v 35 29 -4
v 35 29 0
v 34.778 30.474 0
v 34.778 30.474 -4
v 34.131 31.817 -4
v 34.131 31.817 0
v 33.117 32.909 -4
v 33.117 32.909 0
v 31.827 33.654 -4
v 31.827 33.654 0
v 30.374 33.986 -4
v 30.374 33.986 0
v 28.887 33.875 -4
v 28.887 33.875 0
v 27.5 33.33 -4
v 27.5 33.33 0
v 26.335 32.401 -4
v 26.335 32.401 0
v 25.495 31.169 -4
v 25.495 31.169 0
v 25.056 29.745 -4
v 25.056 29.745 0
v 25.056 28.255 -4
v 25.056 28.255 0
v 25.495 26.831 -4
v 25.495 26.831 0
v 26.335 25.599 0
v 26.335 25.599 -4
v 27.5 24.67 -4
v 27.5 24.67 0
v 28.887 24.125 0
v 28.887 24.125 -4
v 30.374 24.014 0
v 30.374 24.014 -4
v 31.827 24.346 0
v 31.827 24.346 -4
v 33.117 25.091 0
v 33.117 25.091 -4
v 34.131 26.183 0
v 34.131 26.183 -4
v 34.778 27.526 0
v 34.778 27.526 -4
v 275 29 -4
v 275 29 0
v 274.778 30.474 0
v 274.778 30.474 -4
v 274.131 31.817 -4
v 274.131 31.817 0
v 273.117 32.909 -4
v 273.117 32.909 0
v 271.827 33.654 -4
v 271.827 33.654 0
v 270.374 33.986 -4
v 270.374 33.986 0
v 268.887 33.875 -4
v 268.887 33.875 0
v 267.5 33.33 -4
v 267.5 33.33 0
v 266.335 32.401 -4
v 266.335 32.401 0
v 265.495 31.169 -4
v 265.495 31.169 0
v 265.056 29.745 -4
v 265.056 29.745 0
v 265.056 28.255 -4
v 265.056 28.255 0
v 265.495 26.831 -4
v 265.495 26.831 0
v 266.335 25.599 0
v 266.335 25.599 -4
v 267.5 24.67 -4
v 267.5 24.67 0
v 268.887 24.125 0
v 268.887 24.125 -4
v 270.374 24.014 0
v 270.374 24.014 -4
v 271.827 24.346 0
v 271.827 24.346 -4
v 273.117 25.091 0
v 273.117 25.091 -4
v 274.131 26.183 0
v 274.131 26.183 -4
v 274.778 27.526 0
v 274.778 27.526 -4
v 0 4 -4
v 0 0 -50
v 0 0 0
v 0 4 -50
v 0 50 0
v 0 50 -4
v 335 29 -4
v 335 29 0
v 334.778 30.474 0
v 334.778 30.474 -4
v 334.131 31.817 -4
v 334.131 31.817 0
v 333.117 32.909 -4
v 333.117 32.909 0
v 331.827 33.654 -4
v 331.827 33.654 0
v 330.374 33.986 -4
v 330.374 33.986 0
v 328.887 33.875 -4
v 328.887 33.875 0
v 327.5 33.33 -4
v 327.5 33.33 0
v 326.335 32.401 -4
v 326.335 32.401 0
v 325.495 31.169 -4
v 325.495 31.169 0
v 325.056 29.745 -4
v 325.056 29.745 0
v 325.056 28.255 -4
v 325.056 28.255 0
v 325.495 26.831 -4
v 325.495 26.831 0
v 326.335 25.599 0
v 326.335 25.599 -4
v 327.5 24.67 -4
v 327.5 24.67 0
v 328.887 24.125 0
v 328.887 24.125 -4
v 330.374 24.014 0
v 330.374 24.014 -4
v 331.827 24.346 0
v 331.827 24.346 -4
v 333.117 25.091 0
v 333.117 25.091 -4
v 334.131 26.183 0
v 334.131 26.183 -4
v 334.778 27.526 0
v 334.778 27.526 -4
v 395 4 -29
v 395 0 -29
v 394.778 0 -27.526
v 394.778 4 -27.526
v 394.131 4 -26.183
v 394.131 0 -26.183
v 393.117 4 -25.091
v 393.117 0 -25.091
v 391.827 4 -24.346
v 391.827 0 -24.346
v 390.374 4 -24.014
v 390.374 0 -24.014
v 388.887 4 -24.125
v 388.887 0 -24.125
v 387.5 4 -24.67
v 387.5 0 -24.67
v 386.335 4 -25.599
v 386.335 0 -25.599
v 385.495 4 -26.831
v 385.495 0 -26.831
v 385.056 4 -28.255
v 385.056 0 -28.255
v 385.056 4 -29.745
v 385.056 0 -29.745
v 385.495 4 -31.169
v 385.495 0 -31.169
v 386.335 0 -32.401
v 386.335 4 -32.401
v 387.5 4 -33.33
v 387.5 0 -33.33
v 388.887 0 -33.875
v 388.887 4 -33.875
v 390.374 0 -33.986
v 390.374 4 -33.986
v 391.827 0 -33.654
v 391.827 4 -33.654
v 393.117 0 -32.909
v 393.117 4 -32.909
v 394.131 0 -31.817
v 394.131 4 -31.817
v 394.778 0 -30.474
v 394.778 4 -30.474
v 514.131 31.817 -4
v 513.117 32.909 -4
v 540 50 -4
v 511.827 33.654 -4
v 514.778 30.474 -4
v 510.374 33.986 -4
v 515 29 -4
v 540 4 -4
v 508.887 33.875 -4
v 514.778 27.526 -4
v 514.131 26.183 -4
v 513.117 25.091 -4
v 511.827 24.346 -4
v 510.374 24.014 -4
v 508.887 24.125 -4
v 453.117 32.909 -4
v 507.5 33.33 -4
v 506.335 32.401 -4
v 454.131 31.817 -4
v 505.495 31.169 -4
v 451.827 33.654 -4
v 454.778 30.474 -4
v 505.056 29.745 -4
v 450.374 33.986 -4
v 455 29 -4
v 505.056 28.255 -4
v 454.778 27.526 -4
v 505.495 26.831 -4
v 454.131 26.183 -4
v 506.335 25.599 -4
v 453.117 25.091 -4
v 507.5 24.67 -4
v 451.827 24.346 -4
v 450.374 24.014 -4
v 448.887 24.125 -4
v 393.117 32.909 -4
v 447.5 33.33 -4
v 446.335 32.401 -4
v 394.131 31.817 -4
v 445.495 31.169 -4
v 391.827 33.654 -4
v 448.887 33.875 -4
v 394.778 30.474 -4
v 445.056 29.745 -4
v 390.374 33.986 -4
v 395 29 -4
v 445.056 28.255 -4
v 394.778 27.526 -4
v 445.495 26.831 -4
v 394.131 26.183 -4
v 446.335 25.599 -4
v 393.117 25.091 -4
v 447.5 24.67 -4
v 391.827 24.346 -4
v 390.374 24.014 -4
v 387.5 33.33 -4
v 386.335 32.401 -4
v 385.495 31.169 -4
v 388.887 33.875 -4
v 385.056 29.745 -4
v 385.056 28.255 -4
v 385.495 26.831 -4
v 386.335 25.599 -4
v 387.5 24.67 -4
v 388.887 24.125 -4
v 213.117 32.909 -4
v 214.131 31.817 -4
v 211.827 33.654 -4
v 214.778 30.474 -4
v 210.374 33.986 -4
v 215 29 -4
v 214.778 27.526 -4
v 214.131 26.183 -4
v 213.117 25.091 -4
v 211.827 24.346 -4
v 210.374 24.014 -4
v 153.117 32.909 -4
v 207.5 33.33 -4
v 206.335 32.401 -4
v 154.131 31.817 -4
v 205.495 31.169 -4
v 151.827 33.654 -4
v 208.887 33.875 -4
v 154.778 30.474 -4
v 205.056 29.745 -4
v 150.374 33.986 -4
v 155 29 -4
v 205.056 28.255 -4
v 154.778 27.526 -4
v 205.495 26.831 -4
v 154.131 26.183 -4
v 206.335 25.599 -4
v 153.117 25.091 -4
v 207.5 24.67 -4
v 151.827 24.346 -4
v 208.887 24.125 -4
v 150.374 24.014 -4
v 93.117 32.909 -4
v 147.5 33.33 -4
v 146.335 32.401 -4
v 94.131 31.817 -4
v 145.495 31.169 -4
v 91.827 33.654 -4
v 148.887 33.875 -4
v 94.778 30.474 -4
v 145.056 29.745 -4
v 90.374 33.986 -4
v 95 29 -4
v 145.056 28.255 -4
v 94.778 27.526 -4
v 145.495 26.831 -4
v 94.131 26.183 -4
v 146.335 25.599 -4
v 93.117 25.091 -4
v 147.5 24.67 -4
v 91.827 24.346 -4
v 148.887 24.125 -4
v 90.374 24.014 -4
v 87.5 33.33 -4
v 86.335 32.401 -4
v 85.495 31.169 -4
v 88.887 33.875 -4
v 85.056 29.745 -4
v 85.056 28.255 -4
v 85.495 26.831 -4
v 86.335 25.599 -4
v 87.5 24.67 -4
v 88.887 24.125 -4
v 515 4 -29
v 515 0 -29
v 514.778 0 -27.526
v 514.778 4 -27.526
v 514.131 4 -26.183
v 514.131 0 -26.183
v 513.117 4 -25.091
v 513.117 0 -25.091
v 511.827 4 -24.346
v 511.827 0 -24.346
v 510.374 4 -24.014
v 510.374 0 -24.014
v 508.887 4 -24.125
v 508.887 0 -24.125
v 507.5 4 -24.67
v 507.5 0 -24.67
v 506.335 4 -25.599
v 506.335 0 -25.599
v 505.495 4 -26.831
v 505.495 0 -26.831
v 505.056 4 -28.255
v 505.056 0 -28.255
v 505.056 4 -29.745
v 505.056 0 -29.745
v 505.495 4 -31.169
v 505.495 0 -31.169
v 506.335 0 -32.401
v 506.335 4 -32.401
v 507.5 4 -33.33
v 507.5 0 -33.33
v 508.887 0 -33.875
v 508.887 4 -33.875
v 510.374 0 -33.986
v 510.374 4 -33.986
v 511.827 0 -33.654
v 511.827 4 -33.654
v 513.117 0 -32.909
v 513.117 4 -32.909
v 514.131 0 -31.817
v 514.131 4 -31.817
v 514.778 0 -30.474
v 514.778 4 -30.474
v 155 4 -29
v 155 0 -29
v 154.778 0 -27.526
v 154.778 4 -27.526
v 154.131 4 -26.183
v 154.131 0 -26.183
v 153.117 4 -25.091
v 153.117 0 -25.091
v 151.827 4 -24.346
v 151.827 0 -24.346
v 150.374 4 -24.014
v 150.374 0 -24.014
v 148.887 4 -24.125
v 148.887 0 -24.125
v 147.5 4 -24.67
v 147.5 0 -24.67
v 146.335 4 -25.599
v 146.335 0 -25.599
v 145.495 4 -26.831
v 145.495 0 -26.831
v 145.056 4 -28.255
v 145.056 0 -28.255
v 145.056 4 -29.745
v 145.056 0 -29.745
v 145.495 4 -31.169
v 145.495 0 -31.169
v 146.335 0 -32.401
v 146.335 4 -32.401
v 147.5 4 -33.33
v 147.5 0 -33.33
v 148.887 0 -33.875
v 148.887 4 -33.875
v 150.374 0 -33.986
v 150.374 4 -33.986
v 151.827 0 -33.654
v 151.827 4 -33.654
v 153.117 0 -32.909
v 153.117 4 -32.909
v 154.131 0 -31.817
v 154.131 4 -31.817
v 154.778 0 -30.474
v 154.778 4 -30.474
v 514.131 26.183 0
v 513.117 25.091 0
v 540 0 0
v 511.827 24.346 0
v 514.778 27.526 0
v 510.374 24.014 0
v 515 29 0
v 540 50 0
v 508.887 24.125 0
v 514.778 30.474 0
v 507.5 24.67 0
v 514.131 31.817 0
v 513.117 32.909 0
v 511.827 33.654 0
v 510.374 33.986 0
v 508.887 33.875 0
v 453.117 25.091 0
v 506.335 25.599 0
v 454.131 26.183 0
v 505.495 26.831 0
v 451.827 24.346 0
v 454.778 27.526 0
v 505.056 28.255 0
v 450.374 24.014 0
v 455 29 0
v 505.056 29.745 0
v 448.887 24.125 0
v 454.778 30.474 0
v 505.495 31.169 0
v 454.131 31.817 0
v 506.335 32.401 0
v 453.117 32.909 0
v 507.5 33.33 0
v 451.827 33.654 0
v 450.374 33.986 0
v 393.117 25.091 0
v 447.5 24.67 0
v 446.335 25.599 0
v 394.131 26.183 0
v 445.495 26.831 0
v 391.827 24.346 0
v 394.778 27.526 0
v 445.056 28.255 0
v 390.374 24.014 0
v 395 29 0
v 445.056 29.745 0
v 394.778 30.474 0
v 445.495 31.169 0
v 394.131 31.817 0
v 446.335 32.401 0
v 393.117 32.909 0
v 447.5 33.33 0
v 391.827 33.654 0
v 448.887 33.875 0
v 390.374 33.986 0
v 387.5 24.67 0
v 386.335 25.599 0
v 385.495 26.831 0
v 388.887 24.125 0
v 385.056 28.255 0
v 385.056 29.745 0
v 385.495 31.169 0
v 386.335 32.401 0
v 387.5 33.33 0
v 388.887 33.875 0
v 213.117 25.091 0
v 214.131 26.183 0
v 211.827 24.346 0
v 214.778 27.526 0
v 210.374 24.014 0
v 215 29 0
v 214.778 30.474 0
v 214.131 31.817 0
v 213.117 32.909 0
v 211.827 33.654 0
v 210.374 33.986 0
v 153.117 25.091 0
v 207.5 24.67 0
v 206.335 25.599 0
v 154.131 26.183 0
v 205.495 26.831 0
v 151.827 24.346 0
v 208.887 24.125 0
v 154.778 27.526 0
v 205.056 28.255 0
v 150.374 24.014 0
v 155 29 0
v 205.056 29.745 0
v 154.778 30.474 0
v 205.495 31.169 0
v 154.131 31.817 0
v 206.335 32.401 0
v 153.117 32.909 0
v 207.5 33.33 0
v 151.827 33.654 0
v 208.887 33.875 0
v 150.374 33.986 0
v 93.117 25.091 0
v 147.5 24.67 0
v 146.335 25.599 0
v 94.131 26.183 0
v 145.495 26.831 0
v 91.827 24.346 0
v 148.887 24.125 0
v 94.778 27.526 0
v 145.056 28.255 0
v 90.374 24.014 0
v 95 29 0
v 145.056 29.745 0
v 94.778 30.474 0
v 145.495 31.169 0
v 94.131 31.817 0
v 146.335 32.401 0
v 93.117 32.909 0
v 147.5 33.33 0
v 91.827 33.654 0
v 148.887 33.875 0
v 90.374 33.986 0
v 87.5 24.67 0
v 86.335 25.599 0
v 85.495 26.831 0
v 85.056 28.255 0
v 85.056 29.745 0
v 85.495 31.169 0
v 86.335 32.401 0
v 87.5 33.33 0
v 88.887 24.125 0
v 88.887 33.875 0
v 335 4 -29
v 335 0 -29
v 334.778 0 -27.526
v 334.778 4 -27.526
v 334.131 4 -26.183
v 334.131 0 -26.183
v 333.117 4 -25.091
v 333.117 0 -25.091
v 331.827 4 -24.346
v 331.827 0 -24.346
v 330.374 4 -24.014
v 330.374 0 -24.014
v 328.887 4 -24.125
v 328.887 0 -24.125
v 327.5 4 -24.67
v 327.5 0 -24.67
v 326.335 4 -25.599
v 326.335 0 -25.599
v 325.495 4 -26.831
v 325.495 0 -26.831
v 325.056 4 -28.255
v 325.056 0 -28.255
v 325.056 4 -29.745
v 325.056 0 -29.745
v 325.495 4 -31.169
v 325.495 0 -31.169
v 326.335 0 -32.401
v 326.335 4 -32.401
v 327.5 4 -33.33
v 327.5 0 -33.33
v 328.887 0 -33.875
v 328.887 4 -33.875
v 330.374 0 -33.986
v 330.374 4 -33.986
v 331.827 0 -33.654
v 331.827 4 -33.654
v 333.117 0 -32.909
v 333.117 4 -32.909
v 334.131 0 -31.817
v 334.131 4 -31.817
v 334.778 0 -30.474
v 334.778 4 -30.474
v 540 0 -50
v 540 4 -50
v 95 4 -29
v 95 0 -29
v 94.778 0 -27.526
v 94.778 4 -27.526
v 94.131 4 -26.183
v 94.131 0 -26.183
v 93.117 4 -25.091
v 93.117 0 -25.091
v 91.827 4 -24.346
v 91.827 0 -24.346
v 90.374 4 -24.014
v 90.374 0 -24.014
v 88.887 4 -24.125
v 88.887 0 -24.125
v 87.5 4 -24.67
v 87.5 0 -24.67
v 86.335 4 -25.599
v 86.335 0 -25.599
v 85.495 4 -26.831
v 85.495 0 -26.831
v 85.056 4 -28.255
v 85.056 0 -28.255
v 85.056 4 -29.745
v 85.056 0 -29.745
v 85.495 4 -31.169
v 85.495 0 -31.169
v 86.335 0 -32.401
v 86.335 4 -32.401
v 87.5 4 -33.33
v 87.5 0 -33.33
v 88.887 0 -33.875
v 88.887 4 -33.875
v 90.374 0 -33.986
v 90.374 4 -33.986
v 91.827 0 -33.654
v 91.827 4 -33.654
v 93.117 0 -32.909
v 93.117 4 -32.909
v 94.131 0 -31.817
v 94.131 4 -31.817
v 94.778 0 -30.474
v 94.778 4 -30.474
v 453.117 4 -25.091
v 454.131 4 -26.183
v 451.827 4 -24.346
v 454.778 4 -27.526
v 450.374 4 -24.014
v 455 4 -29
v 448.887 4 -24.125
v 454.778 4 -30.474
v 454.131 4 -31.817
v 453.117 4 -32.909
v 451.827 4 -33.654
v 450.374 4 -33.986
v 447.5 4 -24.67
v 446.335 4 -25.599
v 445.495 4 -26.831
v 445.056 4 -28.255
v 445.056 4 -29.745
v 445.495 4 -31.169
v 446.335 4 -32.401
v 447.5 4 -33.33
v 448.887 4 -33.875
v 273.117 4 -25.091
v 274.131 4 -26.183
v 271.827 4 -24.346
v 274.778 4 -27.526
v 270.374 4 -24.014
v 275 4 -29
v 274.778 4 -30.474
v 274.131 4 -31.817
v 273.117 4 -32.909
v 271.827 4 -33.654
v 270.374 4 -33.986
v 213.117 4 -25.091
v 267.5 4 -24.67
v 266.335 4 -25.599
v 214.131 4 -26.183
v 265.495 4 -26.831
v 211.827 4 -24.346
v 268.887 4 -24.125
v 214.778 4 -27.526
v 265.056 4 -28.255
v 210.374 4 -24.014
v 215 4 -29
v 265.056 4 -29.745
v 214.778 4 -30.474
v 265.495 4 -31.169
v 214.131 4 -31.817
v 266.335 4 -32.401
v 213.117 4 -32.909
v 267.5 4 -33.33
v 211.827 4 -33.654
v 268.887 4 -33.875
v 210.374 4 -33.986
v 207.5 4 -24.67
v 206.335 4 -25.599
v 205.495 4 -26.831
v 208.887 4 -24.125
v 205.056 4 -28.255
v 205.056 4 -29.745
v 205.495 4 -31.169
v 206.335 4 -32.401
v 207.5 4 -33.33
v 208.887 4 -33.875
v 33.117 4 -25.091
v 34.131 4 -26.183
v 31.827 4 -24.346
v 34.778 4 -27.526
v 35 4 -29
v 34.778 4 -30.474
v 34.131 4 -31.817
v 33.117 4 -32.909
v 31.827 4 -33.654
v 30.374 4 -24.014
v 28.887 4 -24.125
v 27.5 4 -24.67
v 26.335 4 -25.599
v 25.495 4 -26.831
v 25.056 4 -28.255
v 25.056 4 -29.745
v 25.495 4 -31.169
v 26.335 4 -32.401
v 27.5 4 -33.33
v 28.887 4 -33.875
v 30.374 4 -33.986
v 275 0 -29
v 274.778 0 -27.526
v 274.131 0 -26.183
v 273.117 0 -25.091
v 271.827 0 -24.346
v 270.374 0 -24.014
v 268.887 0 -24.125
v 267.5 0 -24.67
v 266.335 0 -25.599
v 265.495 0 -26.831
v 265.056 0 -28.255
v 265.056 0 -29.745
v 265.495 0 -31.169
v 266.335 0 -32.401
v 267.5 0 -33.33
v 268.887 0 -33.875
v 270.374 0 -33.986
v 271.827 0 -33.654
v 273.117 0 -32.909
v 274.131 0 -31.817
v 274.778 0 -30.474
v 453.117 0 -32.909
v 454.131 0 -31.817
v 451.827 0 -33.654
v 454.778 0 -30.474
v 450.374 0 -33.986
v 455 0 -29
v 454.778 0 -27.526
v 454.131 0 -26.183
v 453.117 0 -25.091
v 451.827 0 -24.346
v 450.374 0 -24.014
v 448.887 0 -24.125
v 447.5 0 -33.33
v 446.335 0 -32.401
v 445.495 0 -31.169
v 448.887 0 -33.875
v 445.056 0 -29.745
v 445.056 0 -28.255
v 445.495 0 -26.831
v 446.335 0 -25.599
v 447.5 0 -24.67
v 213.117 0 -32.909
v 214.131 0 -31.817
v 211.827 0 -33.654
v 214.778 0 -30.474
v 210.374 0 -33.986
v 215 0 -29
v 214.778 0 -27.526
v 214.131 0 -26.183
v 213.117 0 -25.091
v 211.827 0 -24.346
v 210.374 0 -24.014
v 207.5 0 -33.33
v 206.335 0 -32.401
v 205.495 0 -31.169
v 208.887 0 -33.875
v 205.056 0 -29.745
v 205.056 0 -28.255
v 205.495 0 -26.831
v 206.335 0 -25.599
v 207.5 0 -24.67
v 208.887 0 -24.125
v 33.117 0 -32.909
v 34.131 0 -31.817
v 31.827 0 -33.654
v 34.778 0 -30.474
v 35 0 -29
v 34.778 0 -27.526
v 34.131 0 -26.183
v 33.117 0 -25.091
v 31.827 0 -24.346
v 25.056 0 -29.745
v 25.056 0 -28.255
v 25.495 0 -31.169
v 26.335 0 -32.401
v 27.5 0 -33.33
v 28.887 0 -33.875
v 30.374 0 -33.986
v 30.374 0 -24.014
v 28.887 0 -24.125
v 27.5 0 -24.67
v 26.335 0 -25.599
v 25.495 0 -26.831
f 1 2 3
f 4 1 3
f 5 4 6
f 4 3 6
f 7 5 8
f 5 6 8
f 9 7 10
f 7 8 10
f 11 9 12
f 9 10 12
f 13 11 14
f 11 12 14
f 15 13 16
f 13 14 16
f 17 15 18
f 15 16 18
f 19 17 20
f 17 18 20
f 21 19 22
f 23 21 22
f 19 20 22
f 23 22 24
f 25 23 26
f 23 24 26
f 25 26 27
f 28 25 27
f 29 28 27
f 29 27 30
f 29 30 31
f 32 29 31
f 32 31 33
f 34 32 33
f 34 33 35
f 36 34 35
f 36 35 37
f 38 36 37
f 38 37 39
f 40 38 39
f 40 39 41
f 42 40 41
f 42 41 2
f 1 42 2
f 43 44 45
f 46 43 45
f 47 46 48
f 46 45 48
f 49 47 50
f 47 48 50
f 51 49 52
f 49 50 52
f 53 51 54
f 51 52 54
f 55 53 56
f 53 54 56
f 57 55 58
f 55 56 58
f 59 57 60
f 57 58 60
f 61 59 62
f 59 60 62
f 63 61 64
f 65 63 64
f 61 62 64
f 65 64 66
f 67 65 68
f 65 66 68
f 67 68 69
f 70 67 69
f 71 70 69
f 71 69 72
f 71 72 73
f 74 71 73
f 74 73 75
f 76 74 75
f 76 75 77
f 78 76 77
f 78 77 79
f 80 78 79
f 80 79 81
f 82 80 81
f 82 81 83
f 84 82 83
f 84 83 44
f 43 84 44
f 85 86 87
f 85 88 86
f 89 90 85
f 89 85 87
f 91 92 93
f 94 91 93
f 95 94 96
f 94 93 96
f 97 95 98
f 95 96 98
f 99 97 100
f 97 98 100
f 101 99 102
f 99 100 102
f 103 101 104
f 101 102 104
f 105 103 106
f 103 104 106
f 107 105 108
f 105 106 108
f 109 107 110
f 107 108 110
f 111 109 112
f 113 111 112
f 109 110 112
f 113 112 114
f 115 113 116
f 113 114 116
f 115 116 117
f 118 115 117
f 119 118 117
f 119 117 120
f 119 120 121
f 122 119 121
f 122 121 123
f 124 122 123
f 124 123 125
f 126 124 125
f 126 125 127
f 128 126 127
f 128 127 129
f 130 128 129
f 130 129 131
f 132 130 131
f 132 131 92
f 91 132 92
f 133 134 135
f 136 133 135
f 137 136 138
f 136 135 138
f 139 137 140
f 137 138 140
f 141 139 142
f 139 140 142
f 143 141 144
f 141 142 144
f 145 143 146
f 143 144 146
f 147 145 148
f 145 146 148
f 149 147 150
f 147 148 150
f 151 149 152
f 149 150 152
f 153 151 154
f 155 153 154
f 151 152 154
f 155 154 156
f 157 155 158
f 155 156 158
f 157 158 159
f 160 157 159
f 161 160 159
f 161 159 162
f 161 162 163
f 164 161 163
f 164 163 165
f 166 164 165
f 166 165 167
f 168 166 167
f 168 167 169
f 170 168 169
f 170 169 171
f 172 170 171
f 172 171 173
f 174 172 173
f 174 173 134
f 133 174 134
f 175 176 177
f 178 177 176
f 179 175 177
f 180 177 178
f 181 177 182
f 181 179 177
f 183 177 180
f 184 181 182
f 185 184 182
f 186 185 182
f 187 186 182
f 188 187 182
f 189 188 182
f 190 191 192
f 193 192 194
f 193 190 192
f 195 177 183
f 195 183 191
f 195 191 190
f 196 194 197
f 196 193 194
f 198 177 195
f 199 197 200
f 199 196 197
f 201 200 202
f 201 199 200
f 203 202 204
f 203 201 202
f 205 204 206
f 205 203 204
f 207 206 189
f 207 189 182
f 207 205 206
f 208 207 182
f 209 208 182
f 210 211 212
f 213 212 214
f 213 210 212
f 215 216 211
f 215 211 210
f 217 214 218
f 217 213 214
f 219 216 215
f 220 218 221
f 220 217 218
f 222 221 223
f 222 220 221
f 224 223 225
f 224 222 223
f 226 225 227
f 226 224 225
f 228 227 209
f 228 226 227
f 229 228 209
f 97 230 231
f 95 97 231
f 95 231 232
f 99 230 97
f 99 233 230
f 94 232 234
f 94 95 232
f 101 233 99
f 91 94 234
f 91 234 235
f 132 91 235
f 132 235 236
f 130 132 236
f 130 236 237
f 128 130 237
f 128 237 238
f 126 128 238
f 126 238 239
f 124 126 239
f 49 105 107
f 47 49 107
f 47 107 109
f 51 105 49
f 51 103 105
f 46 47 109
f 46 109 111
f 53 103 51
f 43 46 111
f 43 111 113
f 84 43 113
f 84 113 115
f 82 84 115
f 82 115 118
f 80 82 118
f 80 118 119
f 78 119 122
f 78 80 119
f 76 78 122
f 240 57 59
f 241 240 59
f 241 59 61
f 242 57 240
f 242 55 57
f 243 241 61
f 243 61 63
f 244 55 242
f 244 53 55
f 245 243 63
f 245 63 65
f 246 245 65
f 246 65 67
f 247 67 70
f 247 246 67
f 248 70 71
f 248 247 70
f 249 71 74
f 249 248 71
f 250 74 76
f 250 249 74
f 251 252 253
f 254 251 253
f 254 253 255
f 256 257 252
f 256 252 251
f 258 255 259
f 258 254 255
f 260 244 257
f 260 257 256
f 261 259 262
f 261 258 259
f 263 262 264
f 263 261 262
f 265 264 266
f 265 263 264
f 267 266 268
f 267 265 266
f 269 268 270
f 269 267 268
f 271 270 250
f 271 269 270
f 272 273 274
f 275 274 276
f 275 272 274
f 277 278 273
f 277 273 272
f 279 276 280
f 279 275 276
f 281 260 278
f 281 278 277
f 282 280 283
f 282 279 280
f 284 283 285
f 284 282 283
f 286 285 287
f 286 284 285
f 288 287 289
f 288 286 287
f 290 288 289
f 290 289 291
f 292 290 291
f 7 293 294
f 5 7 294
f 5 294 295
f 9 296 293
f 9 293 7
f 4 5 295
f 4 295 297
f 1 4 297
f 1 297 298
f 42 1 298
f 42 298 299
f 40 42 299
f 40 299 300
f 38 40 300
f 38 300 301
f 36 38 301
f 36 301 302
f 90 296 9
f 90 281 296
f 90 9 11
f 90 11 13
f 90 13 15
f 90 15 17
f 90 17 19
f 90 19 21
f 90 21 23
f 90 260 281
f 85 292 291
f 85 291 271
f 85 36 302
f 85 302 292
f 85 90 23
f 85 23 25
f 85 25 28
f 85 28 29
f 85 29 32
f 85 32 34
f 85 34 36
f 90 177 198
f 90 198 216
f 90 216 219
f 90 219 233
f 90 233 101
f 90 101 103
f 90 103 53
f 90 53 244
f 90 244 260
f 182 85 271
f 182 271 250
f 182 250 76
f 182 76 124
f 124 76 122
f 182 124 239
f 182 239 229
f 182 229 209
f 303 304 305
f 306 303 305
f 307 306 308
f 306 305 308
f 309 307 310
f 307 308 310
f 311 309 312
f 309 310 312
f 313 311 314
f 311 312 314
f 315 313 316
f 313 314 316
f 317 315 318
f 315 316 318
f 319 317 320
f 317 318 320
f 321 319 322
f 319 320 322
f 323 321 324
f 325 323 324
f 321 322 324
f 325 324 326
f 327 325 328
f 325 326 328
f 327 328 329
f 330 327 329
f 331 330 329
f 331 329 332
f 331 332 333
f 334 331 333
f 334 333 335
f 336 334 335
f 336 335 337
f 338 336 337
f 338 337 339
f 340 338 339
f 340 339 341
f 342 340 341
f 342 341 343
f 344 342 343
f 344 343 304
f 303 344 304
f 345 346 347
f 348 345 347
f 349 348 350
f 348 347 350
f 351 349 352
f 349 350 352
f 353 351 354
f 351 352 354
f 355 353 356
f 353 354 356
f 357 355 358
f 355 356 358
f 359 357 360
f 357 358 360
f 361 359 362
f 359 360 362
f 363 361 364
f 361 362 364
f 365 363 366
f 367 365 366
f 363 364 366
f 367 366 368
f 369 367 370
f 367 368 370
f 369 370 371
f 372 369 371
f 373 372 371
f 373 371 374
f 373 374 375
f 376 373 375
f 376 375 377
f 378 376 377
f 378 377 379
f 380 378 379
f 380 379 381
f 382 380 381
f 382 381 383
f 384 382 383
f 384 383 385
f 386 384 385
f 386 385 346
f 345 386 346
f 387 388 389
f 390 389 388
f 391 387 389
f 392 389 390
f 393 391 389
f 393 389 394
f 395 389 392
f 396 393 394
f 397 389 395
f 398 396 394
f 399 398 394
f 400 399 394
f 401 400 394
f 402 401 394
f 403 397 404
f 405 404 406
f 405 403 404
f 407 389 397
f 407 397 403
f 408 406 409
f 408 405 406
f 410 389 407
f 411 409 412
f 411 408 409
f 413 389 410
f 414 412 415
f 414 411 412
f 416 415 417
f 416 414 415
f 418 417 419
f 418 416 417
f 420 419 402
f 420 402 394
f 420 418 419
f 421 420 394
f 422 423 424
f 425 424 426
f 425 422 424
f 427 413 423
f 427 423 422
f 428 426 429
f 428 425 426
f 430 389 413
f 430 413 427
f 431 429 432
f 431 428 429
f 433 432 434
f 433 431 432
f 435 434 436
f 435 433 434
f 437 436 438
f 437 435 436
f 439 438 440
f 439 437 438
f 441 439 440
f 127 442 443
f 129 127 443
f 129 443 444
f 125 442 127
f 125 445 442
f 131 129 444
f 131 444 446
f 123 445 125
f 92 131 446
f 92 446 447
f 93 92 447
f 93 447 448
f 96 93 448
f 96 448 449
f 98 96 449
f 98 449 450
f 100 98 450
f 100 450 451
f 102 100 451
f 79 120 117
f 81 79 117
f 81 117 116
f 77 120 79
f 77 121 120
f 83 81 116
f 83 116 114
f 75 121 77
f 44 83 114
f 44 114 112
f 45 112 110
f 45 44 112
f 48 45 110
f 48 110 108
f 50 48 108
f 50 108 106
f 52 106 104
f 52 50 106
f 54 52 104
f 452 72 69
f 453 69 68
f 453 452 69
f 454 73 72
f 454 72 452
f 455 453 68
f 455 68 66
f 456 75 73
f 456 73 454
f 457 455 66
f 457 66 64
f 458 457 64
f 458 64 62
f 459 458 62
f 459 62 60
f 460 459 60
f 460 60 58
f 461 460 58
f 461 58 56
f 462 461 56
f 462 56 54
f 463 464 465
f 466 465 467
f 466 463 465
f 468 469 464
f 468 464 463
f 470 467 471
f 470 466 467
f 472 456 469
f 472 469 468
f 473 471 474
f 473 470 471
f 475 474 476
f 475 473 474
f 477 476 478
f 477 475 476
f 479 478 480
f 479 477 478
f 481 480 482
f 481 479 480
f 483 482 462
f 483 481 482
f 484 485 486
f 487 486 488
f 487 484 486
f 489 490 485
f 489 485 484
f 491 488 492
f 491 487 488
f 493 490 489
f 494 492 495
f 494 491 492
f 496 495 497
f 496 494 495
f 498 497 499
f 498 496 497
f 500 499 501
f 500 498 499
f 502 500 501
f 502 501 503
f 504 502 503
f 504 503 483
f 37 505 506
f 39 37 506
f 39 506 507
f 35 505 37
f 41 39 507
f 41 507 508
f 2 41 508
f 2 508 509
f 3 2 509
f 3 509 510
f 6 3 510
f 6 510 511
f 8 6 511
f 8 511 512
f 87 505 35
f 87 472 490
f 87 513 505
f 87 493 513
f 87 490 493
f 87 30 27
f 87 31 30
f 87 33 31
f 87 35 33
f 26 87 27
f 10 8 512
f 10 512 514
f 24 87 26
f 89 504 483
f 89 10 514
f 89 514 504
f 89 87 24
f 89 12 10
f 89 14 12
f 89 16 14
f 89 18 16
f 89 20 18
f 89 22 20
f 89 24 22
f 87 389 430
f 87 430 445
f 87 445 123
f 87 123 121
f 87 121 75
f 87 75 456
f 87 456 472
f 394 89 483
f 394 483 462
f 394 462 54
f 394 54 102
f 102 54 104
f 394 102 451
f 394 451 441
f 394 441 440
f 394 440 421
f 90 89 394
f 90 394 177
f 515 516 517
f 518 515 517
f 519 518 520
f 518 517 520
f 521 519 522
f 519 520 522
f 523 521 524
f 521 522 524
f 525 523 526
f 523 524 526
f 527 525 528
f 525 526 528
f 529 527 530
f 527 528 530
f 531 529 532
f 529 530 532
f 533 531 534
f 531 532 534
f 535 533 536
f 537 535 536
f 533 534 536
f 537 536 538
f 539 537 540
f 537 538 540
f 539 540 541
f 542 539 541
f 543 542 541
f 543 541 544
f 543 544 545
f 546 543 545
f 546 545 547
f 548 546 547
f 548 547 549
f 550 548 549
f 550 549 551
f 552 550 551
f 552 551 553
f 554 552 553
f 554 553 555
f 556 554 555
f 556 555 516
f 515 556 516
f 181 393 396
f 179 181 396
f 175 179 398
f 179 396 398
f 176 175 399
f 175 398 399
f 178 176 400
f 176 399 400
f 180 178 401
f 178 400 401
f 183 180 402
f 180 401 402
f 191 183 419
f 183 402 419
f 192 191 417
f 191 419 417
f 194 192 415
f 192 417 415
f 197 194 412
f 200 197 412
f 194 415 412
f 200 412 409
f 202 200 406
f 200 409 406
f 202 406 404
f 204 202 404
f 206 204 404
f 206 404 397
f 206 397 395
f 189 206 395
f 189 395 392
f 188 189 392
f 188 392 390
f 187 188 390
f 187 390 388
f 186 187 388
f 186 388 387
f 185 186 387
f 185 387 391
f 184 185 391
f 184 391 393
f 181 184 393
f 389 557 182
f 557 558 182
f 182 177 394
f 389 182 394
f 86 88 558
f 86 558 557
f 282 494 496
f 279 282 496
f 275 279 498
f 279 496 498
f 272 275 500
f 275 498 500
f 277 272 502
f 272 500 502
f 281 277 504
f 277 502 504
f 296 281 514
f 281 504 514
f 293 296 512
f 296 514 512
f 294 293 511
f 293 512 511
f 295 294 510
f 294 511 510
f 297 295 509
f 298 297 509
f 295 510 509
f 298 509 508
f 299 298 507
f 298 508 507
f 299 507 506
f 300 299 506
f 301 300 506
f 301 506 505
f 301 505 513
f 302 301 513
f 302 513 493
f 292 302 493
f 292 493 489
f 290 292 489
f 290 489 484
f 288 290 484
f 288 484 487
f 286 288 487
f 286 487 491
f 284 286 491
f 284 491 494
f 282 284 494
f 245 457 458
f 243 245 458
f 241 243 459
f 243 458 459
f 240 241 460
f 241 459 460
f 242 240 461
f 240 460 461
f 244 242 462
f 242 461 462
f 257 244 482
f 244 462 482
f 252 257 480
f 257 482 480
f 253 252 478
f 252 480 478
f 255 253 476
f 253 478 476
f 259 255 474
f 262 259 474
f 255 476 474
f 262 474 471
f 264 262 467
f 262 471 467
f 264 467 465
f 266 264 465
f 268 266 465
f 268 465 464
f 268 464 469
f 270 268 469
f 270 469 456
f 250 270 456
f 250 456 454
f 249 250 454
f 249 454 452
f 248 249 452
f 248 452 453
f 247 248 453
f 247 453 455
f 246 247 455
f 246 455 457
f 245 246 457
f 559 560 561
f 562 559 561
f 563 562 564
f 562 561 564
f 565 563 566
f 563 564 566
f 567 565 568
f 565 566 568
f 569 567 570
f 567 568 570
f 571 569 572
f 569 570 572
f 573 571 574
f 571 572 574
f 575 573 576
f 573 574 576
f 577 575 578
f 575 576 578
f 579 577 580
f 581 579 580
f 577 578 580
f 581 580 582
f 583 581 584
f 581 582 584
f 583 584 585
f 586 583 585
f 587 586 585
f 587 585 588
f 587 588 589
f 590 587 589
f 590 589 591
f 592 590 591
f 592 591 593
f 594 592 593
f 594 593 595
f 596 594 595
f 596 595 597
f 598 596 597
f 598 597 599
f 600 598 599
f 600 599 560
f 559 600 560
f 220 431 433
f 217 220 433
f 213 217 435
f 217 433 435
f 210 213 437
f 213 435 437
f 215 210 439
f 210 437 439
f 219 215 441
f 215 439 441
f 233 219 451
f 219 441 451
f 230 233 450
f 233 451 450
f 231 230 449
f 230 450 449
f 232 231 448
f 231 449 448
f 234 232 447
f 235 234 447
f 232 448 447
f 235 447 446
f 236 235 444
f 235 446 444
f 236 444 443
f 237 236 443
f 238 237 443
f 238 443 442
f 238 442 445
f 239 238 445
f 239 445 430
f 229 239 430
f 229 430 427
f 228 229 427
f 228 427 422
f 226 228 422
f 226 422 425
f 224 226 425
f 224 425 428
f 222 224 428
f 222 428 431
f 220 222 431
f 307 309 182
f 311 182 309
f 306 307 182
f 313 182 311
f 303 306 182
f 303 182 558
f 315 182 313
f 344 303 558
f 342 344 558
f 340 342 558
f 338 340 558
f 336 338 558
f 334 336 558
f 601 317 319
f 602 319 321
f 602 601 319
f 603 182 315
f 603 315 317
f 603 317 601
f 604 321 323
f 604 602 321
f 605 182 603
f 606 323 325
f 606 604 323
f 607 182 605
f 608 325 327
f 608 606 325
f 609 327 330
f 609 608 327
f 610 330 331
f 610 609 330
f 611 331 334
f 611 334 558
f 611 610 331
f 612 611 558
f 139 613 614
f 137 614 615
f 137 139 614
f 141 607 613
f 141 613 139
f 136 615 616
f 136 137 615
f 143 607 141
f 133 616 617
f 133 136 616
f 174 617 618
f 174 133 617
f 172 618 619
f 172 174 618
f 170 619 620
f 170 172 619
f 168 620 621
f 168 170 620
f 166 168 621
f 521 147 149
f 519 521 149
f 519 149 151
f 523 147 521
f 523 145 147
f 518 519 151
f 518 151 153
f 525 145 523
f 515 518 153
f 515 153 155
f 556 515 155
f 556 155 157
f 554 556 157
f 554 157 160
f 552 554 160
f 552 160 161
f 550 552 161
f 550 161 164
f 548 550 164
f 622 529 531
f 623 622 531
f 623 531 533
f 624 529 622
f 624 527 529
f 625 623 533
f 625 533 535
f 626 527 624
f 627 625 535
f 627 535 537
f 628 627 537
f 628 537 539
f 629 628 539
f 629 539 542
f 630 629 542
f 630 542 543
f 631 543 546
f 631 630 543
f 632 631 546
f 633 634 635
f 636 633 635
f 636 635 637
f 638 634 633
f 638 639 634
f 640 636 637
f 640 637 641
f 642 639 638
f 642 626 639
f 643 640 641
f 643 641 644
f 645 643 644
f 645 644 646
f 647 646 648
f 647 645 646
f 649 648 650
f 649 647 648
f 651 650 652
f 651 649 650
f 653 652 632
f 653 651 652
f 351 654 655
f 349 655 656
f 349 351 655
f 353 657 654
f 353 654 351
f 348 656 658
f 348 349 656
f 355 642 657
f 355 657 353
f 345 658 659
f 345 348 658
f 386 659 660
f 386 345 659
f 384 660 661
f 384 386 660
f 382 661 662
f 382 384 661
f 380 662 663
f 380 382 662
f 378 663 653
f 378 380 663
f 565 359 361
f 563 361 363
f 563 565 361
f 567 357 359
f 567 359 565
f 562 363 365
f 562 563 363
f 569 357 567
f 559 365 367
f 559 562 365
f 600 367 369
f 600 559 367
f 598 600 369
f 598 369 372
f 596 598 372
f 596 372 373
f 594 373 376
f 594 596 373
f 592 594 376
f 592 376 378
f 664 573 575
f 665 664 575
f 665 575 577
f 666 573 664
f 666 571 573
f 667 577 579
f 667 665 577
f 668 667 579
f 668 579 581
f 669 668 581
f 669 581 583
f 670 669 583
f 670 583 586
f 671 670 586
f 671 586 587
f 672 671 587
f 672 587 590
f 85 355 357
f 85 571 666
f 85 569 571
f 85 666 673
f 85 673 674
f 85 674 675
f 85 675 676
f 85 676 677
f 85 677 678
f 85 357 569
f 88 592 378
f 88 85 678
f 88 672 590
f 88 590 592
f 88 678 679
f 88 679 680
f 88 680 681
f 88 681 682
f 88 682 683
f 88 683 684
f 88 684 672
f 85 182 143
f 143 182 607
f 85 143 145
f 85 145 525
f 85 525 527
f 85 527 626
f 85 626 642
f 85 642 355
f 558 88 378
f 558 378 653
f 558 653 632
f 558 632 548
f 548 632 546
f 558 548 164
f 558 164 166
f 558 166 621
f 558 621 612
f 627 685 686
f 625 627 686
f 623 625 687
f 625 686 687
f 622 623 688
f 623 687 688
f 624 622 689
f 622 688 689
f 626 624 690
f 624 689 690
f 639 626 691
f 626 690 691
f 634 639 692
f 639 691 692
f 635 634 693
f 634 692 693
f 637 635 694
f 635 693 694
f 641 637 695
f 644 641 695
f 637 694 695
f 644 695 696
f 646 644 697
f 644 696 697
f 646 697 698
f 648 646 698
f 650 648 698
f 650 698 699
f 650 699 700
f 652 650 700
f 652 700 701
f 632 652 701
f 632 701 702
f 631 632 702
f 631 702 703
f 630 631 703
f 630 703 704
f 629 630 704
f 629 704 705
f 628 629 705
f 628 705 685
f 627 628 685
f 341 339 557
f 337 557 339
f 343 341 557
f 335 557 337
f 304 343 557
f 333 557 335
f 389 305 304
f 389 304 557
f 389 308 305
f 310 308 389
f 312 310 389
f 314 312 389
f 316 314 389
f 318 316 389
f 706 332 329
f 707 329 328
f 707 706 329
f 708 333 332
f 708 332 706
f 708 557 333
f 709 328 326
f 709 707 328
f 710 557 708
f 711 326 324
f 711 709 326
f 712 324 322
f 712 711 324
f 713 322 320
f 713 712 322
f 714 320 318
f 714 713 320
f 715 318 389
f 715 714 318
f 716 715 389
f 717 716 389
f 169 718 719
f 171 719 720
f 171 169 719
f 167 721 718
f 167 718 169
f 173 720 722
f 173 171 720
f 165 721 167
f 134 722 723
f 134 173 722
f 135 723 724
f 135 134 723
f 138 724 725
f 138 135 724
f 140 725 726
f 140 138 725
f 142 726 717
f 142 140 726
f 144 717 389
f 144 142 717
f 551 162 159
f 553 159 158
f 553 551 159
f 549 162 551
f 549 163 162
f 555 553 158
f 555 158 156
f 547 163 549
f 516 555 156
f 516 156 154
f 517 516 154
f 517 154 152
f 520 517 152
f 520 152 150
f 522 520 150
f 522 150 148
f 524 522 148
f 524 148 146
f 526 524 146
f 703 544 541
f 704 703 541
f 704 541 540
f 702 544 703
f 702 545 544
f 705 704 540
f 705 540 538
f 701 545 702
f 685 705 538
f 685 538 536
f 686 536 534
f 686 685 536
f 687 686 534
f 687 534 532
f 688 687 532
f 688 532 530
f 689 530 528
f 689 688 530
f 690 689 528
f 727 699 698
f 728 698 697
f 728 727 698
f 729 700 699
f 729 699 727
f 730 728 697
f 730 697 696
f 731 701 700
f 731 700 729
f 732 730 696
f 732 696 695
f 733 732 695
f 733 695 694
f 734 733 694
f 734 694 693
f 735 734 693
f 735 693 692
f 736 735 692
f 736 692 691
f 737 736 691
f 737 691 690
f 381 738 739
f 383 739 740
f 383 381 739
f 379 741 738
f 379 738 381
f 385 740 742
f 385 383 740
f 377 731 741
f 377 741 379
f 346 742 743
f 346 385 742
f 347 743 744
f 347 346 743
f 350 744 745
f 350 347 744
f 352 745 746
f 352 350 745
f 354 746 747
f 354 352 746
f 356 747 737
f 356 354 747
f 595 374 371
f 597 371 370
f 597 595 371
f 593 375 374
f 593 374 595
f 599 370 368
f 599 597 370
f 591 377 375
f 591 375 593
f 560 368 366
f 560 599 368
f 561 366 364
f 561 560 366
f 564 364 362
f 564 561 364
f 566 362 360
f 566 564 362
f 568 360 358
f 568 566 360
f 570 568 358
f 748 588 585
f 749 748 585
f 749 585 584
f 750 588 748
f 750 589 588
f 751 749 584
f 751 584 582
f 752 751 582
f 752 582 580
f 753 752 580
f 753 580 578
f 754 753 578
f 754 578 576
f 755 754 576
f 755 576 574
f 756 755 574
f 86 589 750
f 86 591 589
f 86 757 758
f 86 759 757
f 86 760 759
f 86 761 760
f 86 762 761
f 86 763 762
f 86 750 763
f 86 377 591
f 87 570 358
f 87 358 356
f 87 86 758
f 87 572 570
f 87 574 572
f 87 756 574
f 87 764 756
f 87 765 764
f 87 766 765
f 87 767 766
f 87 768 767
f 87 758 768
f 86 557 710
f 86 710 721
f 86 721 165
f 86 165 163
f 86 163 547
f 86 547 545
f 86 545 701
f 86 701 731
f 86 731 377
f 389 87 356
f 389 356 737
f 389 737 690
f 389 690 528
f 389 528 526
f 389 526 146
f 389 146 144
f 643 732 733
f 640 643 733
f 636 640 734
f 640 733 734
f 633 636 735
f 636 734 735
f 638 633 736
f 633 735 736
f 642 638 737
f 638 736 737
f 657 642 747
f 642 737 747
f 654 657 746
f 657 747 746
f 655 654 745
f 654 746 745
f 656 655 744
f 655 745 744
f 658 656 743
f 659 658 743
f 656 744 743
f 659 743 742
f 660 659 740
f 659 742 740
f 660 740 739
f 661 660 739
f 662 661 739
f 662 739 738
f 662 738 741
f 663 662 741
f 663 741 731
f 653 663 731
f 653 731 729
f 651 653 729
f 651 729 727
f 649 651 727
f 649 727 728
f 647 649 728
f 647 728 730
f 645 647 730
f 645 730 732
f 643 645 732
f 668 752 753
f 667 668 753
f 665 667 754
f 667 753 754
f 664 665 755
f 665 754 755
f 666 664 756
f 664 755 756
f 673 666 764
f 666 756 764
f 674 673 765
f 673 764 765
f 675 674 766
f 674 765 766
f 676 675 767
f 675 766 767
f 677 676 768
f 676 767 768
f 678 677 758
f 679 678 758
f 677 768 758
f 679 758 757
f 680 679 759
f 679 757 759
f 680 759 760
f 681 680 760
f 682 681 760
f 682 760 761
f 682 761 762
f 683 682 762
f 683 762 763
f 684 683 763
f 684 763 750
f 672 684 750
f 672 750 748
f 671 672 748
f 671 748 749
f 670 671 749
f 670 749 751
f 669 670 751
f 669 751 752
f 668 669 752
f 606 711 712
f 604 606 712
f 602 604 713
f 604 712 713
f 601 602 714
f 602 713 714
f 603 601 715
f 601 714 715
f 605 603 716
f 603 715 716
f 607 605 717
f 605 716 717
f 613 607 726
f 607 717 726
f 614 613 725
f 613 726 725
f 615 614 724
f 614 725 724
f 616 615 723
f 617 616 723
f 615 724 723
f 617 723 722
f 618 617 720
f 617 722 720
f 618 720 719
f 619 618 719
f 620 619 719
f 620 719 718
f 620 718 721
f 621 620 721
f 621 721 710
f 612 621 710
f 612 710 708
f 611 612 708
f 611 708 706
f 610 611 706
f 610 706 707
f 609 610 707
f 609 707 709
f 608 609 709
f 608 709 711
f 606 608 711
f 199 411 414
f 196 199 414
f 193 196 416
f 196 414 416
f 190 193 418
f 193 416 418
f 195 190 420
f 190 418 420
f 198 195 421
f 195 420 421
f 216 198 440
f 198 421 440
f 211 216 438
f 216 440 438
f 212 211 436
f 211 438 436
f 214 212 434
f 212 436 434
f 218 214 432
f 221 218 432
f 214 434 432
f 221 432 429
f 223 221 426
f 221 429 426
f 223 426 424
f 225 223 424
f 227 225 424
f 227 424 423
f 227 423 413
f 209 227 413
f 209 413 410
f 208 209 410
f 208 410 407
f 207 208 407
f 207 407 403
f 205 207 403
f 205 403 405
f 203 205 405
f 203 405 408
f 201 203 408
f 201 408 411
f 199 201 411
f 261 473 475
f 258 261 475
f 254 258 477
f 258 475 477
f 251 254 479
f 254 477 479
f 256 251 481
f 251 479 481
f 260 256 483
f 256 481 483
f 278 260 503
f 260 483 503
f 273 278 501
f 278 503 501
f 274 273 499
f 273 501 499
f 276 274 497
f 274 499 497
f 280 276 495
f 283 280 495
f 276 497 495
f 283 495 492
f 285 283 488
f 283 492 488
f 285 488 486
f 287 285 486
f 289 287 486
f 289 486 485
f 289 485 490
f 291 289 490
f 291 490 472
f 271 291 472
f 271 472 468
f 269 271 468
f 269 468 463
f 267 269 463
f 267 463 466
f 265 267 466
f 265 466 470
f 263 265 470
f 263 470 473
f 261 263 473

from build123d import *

# Parameters (mm, degrees)
EXTRUDE_1_DEPTH     = 540
SKETCH_2_R          = 5
CUT_EXTRUDE_1_DEPTH = 51
SKETCH_3_R          = 5
CUT_EXTRUDE_2_DEPTH = 51


with BuildPart() as part:
    # Эскиз1 → Вытянуть-Тонкостенный1 (new body)
    with BuildSketch(Plane(origin=(0, 0, 0), x_dir=(0, 0, -1), z_dir=(1, 0, 0))):
        Polygon((50, 0), (0, 0), (0, 50), (4, 50), (4, 4), (50, 4), align=None)
    extrude(amount=EXTRUDE_1_DEPTH)

    # Эскиз2 → Вырез-Вытянуть1 (cut, through all)
    with BuildSketch(Plane.XY):
        with Locations((30, 29)):
            Circle(SKETCH_2_R)
        with Locations((90, 29)):
            Circle(SKETCH_2_R)
        with Locations((150, 29)):
            Circle(SKETCH_2_R)
        with Locations((210, 29)):
            Circle(SKETCH_2_R)
        with Locations((270, 29)):
            Circle(SKETCH_2_R)
        with Locations((330, 29)):
            Circle(SKETCH_2_R)
        with Locations((390, 29)):
            Circle(SKETCH_2_R)
        with Locations((450, 29)):
            Circle(SKETCH_2_R)
        with Locations((510, 29)):
            Circle(SKETCH_2_R)
    extrude(amount=-CUT_EXTRUDE_1_DEPTH, mode=Mode.SUBTRACT)

    # Эскиз3 → Вырез-Вытянуть2 (cut, through all)
    with BuildSketch(Plane.XZ):
        with Locations((30, -29)):
            Circle(SKETCH_3_R)
        with Locations((90, -29)):
            Circle(SKETCH_3_R)
        with Locations((150, -29)):
            Circle(SKETCH_3_R)
        with Locations((210, -29)):
            Circle(SKETCH_3_R)
        with Locations((270, -29)):
            Circle(SKETCH_3_R)
        with Locations((330, -29)):
            Circle(SKETCH_3_R)
        with Locations((390, -29)):
            Circle(SKETCH_3_R)
        with Locations((450, -29)):
            Circle(SKETCH_3_R)
        with Locations((510, -29)):
            Circle(SKETCH_3_R)
    extrude(amount=-CUT_EXTRUDE_2_DEPTH, mode=Mode.SUBTRACT)


solid = part.part
